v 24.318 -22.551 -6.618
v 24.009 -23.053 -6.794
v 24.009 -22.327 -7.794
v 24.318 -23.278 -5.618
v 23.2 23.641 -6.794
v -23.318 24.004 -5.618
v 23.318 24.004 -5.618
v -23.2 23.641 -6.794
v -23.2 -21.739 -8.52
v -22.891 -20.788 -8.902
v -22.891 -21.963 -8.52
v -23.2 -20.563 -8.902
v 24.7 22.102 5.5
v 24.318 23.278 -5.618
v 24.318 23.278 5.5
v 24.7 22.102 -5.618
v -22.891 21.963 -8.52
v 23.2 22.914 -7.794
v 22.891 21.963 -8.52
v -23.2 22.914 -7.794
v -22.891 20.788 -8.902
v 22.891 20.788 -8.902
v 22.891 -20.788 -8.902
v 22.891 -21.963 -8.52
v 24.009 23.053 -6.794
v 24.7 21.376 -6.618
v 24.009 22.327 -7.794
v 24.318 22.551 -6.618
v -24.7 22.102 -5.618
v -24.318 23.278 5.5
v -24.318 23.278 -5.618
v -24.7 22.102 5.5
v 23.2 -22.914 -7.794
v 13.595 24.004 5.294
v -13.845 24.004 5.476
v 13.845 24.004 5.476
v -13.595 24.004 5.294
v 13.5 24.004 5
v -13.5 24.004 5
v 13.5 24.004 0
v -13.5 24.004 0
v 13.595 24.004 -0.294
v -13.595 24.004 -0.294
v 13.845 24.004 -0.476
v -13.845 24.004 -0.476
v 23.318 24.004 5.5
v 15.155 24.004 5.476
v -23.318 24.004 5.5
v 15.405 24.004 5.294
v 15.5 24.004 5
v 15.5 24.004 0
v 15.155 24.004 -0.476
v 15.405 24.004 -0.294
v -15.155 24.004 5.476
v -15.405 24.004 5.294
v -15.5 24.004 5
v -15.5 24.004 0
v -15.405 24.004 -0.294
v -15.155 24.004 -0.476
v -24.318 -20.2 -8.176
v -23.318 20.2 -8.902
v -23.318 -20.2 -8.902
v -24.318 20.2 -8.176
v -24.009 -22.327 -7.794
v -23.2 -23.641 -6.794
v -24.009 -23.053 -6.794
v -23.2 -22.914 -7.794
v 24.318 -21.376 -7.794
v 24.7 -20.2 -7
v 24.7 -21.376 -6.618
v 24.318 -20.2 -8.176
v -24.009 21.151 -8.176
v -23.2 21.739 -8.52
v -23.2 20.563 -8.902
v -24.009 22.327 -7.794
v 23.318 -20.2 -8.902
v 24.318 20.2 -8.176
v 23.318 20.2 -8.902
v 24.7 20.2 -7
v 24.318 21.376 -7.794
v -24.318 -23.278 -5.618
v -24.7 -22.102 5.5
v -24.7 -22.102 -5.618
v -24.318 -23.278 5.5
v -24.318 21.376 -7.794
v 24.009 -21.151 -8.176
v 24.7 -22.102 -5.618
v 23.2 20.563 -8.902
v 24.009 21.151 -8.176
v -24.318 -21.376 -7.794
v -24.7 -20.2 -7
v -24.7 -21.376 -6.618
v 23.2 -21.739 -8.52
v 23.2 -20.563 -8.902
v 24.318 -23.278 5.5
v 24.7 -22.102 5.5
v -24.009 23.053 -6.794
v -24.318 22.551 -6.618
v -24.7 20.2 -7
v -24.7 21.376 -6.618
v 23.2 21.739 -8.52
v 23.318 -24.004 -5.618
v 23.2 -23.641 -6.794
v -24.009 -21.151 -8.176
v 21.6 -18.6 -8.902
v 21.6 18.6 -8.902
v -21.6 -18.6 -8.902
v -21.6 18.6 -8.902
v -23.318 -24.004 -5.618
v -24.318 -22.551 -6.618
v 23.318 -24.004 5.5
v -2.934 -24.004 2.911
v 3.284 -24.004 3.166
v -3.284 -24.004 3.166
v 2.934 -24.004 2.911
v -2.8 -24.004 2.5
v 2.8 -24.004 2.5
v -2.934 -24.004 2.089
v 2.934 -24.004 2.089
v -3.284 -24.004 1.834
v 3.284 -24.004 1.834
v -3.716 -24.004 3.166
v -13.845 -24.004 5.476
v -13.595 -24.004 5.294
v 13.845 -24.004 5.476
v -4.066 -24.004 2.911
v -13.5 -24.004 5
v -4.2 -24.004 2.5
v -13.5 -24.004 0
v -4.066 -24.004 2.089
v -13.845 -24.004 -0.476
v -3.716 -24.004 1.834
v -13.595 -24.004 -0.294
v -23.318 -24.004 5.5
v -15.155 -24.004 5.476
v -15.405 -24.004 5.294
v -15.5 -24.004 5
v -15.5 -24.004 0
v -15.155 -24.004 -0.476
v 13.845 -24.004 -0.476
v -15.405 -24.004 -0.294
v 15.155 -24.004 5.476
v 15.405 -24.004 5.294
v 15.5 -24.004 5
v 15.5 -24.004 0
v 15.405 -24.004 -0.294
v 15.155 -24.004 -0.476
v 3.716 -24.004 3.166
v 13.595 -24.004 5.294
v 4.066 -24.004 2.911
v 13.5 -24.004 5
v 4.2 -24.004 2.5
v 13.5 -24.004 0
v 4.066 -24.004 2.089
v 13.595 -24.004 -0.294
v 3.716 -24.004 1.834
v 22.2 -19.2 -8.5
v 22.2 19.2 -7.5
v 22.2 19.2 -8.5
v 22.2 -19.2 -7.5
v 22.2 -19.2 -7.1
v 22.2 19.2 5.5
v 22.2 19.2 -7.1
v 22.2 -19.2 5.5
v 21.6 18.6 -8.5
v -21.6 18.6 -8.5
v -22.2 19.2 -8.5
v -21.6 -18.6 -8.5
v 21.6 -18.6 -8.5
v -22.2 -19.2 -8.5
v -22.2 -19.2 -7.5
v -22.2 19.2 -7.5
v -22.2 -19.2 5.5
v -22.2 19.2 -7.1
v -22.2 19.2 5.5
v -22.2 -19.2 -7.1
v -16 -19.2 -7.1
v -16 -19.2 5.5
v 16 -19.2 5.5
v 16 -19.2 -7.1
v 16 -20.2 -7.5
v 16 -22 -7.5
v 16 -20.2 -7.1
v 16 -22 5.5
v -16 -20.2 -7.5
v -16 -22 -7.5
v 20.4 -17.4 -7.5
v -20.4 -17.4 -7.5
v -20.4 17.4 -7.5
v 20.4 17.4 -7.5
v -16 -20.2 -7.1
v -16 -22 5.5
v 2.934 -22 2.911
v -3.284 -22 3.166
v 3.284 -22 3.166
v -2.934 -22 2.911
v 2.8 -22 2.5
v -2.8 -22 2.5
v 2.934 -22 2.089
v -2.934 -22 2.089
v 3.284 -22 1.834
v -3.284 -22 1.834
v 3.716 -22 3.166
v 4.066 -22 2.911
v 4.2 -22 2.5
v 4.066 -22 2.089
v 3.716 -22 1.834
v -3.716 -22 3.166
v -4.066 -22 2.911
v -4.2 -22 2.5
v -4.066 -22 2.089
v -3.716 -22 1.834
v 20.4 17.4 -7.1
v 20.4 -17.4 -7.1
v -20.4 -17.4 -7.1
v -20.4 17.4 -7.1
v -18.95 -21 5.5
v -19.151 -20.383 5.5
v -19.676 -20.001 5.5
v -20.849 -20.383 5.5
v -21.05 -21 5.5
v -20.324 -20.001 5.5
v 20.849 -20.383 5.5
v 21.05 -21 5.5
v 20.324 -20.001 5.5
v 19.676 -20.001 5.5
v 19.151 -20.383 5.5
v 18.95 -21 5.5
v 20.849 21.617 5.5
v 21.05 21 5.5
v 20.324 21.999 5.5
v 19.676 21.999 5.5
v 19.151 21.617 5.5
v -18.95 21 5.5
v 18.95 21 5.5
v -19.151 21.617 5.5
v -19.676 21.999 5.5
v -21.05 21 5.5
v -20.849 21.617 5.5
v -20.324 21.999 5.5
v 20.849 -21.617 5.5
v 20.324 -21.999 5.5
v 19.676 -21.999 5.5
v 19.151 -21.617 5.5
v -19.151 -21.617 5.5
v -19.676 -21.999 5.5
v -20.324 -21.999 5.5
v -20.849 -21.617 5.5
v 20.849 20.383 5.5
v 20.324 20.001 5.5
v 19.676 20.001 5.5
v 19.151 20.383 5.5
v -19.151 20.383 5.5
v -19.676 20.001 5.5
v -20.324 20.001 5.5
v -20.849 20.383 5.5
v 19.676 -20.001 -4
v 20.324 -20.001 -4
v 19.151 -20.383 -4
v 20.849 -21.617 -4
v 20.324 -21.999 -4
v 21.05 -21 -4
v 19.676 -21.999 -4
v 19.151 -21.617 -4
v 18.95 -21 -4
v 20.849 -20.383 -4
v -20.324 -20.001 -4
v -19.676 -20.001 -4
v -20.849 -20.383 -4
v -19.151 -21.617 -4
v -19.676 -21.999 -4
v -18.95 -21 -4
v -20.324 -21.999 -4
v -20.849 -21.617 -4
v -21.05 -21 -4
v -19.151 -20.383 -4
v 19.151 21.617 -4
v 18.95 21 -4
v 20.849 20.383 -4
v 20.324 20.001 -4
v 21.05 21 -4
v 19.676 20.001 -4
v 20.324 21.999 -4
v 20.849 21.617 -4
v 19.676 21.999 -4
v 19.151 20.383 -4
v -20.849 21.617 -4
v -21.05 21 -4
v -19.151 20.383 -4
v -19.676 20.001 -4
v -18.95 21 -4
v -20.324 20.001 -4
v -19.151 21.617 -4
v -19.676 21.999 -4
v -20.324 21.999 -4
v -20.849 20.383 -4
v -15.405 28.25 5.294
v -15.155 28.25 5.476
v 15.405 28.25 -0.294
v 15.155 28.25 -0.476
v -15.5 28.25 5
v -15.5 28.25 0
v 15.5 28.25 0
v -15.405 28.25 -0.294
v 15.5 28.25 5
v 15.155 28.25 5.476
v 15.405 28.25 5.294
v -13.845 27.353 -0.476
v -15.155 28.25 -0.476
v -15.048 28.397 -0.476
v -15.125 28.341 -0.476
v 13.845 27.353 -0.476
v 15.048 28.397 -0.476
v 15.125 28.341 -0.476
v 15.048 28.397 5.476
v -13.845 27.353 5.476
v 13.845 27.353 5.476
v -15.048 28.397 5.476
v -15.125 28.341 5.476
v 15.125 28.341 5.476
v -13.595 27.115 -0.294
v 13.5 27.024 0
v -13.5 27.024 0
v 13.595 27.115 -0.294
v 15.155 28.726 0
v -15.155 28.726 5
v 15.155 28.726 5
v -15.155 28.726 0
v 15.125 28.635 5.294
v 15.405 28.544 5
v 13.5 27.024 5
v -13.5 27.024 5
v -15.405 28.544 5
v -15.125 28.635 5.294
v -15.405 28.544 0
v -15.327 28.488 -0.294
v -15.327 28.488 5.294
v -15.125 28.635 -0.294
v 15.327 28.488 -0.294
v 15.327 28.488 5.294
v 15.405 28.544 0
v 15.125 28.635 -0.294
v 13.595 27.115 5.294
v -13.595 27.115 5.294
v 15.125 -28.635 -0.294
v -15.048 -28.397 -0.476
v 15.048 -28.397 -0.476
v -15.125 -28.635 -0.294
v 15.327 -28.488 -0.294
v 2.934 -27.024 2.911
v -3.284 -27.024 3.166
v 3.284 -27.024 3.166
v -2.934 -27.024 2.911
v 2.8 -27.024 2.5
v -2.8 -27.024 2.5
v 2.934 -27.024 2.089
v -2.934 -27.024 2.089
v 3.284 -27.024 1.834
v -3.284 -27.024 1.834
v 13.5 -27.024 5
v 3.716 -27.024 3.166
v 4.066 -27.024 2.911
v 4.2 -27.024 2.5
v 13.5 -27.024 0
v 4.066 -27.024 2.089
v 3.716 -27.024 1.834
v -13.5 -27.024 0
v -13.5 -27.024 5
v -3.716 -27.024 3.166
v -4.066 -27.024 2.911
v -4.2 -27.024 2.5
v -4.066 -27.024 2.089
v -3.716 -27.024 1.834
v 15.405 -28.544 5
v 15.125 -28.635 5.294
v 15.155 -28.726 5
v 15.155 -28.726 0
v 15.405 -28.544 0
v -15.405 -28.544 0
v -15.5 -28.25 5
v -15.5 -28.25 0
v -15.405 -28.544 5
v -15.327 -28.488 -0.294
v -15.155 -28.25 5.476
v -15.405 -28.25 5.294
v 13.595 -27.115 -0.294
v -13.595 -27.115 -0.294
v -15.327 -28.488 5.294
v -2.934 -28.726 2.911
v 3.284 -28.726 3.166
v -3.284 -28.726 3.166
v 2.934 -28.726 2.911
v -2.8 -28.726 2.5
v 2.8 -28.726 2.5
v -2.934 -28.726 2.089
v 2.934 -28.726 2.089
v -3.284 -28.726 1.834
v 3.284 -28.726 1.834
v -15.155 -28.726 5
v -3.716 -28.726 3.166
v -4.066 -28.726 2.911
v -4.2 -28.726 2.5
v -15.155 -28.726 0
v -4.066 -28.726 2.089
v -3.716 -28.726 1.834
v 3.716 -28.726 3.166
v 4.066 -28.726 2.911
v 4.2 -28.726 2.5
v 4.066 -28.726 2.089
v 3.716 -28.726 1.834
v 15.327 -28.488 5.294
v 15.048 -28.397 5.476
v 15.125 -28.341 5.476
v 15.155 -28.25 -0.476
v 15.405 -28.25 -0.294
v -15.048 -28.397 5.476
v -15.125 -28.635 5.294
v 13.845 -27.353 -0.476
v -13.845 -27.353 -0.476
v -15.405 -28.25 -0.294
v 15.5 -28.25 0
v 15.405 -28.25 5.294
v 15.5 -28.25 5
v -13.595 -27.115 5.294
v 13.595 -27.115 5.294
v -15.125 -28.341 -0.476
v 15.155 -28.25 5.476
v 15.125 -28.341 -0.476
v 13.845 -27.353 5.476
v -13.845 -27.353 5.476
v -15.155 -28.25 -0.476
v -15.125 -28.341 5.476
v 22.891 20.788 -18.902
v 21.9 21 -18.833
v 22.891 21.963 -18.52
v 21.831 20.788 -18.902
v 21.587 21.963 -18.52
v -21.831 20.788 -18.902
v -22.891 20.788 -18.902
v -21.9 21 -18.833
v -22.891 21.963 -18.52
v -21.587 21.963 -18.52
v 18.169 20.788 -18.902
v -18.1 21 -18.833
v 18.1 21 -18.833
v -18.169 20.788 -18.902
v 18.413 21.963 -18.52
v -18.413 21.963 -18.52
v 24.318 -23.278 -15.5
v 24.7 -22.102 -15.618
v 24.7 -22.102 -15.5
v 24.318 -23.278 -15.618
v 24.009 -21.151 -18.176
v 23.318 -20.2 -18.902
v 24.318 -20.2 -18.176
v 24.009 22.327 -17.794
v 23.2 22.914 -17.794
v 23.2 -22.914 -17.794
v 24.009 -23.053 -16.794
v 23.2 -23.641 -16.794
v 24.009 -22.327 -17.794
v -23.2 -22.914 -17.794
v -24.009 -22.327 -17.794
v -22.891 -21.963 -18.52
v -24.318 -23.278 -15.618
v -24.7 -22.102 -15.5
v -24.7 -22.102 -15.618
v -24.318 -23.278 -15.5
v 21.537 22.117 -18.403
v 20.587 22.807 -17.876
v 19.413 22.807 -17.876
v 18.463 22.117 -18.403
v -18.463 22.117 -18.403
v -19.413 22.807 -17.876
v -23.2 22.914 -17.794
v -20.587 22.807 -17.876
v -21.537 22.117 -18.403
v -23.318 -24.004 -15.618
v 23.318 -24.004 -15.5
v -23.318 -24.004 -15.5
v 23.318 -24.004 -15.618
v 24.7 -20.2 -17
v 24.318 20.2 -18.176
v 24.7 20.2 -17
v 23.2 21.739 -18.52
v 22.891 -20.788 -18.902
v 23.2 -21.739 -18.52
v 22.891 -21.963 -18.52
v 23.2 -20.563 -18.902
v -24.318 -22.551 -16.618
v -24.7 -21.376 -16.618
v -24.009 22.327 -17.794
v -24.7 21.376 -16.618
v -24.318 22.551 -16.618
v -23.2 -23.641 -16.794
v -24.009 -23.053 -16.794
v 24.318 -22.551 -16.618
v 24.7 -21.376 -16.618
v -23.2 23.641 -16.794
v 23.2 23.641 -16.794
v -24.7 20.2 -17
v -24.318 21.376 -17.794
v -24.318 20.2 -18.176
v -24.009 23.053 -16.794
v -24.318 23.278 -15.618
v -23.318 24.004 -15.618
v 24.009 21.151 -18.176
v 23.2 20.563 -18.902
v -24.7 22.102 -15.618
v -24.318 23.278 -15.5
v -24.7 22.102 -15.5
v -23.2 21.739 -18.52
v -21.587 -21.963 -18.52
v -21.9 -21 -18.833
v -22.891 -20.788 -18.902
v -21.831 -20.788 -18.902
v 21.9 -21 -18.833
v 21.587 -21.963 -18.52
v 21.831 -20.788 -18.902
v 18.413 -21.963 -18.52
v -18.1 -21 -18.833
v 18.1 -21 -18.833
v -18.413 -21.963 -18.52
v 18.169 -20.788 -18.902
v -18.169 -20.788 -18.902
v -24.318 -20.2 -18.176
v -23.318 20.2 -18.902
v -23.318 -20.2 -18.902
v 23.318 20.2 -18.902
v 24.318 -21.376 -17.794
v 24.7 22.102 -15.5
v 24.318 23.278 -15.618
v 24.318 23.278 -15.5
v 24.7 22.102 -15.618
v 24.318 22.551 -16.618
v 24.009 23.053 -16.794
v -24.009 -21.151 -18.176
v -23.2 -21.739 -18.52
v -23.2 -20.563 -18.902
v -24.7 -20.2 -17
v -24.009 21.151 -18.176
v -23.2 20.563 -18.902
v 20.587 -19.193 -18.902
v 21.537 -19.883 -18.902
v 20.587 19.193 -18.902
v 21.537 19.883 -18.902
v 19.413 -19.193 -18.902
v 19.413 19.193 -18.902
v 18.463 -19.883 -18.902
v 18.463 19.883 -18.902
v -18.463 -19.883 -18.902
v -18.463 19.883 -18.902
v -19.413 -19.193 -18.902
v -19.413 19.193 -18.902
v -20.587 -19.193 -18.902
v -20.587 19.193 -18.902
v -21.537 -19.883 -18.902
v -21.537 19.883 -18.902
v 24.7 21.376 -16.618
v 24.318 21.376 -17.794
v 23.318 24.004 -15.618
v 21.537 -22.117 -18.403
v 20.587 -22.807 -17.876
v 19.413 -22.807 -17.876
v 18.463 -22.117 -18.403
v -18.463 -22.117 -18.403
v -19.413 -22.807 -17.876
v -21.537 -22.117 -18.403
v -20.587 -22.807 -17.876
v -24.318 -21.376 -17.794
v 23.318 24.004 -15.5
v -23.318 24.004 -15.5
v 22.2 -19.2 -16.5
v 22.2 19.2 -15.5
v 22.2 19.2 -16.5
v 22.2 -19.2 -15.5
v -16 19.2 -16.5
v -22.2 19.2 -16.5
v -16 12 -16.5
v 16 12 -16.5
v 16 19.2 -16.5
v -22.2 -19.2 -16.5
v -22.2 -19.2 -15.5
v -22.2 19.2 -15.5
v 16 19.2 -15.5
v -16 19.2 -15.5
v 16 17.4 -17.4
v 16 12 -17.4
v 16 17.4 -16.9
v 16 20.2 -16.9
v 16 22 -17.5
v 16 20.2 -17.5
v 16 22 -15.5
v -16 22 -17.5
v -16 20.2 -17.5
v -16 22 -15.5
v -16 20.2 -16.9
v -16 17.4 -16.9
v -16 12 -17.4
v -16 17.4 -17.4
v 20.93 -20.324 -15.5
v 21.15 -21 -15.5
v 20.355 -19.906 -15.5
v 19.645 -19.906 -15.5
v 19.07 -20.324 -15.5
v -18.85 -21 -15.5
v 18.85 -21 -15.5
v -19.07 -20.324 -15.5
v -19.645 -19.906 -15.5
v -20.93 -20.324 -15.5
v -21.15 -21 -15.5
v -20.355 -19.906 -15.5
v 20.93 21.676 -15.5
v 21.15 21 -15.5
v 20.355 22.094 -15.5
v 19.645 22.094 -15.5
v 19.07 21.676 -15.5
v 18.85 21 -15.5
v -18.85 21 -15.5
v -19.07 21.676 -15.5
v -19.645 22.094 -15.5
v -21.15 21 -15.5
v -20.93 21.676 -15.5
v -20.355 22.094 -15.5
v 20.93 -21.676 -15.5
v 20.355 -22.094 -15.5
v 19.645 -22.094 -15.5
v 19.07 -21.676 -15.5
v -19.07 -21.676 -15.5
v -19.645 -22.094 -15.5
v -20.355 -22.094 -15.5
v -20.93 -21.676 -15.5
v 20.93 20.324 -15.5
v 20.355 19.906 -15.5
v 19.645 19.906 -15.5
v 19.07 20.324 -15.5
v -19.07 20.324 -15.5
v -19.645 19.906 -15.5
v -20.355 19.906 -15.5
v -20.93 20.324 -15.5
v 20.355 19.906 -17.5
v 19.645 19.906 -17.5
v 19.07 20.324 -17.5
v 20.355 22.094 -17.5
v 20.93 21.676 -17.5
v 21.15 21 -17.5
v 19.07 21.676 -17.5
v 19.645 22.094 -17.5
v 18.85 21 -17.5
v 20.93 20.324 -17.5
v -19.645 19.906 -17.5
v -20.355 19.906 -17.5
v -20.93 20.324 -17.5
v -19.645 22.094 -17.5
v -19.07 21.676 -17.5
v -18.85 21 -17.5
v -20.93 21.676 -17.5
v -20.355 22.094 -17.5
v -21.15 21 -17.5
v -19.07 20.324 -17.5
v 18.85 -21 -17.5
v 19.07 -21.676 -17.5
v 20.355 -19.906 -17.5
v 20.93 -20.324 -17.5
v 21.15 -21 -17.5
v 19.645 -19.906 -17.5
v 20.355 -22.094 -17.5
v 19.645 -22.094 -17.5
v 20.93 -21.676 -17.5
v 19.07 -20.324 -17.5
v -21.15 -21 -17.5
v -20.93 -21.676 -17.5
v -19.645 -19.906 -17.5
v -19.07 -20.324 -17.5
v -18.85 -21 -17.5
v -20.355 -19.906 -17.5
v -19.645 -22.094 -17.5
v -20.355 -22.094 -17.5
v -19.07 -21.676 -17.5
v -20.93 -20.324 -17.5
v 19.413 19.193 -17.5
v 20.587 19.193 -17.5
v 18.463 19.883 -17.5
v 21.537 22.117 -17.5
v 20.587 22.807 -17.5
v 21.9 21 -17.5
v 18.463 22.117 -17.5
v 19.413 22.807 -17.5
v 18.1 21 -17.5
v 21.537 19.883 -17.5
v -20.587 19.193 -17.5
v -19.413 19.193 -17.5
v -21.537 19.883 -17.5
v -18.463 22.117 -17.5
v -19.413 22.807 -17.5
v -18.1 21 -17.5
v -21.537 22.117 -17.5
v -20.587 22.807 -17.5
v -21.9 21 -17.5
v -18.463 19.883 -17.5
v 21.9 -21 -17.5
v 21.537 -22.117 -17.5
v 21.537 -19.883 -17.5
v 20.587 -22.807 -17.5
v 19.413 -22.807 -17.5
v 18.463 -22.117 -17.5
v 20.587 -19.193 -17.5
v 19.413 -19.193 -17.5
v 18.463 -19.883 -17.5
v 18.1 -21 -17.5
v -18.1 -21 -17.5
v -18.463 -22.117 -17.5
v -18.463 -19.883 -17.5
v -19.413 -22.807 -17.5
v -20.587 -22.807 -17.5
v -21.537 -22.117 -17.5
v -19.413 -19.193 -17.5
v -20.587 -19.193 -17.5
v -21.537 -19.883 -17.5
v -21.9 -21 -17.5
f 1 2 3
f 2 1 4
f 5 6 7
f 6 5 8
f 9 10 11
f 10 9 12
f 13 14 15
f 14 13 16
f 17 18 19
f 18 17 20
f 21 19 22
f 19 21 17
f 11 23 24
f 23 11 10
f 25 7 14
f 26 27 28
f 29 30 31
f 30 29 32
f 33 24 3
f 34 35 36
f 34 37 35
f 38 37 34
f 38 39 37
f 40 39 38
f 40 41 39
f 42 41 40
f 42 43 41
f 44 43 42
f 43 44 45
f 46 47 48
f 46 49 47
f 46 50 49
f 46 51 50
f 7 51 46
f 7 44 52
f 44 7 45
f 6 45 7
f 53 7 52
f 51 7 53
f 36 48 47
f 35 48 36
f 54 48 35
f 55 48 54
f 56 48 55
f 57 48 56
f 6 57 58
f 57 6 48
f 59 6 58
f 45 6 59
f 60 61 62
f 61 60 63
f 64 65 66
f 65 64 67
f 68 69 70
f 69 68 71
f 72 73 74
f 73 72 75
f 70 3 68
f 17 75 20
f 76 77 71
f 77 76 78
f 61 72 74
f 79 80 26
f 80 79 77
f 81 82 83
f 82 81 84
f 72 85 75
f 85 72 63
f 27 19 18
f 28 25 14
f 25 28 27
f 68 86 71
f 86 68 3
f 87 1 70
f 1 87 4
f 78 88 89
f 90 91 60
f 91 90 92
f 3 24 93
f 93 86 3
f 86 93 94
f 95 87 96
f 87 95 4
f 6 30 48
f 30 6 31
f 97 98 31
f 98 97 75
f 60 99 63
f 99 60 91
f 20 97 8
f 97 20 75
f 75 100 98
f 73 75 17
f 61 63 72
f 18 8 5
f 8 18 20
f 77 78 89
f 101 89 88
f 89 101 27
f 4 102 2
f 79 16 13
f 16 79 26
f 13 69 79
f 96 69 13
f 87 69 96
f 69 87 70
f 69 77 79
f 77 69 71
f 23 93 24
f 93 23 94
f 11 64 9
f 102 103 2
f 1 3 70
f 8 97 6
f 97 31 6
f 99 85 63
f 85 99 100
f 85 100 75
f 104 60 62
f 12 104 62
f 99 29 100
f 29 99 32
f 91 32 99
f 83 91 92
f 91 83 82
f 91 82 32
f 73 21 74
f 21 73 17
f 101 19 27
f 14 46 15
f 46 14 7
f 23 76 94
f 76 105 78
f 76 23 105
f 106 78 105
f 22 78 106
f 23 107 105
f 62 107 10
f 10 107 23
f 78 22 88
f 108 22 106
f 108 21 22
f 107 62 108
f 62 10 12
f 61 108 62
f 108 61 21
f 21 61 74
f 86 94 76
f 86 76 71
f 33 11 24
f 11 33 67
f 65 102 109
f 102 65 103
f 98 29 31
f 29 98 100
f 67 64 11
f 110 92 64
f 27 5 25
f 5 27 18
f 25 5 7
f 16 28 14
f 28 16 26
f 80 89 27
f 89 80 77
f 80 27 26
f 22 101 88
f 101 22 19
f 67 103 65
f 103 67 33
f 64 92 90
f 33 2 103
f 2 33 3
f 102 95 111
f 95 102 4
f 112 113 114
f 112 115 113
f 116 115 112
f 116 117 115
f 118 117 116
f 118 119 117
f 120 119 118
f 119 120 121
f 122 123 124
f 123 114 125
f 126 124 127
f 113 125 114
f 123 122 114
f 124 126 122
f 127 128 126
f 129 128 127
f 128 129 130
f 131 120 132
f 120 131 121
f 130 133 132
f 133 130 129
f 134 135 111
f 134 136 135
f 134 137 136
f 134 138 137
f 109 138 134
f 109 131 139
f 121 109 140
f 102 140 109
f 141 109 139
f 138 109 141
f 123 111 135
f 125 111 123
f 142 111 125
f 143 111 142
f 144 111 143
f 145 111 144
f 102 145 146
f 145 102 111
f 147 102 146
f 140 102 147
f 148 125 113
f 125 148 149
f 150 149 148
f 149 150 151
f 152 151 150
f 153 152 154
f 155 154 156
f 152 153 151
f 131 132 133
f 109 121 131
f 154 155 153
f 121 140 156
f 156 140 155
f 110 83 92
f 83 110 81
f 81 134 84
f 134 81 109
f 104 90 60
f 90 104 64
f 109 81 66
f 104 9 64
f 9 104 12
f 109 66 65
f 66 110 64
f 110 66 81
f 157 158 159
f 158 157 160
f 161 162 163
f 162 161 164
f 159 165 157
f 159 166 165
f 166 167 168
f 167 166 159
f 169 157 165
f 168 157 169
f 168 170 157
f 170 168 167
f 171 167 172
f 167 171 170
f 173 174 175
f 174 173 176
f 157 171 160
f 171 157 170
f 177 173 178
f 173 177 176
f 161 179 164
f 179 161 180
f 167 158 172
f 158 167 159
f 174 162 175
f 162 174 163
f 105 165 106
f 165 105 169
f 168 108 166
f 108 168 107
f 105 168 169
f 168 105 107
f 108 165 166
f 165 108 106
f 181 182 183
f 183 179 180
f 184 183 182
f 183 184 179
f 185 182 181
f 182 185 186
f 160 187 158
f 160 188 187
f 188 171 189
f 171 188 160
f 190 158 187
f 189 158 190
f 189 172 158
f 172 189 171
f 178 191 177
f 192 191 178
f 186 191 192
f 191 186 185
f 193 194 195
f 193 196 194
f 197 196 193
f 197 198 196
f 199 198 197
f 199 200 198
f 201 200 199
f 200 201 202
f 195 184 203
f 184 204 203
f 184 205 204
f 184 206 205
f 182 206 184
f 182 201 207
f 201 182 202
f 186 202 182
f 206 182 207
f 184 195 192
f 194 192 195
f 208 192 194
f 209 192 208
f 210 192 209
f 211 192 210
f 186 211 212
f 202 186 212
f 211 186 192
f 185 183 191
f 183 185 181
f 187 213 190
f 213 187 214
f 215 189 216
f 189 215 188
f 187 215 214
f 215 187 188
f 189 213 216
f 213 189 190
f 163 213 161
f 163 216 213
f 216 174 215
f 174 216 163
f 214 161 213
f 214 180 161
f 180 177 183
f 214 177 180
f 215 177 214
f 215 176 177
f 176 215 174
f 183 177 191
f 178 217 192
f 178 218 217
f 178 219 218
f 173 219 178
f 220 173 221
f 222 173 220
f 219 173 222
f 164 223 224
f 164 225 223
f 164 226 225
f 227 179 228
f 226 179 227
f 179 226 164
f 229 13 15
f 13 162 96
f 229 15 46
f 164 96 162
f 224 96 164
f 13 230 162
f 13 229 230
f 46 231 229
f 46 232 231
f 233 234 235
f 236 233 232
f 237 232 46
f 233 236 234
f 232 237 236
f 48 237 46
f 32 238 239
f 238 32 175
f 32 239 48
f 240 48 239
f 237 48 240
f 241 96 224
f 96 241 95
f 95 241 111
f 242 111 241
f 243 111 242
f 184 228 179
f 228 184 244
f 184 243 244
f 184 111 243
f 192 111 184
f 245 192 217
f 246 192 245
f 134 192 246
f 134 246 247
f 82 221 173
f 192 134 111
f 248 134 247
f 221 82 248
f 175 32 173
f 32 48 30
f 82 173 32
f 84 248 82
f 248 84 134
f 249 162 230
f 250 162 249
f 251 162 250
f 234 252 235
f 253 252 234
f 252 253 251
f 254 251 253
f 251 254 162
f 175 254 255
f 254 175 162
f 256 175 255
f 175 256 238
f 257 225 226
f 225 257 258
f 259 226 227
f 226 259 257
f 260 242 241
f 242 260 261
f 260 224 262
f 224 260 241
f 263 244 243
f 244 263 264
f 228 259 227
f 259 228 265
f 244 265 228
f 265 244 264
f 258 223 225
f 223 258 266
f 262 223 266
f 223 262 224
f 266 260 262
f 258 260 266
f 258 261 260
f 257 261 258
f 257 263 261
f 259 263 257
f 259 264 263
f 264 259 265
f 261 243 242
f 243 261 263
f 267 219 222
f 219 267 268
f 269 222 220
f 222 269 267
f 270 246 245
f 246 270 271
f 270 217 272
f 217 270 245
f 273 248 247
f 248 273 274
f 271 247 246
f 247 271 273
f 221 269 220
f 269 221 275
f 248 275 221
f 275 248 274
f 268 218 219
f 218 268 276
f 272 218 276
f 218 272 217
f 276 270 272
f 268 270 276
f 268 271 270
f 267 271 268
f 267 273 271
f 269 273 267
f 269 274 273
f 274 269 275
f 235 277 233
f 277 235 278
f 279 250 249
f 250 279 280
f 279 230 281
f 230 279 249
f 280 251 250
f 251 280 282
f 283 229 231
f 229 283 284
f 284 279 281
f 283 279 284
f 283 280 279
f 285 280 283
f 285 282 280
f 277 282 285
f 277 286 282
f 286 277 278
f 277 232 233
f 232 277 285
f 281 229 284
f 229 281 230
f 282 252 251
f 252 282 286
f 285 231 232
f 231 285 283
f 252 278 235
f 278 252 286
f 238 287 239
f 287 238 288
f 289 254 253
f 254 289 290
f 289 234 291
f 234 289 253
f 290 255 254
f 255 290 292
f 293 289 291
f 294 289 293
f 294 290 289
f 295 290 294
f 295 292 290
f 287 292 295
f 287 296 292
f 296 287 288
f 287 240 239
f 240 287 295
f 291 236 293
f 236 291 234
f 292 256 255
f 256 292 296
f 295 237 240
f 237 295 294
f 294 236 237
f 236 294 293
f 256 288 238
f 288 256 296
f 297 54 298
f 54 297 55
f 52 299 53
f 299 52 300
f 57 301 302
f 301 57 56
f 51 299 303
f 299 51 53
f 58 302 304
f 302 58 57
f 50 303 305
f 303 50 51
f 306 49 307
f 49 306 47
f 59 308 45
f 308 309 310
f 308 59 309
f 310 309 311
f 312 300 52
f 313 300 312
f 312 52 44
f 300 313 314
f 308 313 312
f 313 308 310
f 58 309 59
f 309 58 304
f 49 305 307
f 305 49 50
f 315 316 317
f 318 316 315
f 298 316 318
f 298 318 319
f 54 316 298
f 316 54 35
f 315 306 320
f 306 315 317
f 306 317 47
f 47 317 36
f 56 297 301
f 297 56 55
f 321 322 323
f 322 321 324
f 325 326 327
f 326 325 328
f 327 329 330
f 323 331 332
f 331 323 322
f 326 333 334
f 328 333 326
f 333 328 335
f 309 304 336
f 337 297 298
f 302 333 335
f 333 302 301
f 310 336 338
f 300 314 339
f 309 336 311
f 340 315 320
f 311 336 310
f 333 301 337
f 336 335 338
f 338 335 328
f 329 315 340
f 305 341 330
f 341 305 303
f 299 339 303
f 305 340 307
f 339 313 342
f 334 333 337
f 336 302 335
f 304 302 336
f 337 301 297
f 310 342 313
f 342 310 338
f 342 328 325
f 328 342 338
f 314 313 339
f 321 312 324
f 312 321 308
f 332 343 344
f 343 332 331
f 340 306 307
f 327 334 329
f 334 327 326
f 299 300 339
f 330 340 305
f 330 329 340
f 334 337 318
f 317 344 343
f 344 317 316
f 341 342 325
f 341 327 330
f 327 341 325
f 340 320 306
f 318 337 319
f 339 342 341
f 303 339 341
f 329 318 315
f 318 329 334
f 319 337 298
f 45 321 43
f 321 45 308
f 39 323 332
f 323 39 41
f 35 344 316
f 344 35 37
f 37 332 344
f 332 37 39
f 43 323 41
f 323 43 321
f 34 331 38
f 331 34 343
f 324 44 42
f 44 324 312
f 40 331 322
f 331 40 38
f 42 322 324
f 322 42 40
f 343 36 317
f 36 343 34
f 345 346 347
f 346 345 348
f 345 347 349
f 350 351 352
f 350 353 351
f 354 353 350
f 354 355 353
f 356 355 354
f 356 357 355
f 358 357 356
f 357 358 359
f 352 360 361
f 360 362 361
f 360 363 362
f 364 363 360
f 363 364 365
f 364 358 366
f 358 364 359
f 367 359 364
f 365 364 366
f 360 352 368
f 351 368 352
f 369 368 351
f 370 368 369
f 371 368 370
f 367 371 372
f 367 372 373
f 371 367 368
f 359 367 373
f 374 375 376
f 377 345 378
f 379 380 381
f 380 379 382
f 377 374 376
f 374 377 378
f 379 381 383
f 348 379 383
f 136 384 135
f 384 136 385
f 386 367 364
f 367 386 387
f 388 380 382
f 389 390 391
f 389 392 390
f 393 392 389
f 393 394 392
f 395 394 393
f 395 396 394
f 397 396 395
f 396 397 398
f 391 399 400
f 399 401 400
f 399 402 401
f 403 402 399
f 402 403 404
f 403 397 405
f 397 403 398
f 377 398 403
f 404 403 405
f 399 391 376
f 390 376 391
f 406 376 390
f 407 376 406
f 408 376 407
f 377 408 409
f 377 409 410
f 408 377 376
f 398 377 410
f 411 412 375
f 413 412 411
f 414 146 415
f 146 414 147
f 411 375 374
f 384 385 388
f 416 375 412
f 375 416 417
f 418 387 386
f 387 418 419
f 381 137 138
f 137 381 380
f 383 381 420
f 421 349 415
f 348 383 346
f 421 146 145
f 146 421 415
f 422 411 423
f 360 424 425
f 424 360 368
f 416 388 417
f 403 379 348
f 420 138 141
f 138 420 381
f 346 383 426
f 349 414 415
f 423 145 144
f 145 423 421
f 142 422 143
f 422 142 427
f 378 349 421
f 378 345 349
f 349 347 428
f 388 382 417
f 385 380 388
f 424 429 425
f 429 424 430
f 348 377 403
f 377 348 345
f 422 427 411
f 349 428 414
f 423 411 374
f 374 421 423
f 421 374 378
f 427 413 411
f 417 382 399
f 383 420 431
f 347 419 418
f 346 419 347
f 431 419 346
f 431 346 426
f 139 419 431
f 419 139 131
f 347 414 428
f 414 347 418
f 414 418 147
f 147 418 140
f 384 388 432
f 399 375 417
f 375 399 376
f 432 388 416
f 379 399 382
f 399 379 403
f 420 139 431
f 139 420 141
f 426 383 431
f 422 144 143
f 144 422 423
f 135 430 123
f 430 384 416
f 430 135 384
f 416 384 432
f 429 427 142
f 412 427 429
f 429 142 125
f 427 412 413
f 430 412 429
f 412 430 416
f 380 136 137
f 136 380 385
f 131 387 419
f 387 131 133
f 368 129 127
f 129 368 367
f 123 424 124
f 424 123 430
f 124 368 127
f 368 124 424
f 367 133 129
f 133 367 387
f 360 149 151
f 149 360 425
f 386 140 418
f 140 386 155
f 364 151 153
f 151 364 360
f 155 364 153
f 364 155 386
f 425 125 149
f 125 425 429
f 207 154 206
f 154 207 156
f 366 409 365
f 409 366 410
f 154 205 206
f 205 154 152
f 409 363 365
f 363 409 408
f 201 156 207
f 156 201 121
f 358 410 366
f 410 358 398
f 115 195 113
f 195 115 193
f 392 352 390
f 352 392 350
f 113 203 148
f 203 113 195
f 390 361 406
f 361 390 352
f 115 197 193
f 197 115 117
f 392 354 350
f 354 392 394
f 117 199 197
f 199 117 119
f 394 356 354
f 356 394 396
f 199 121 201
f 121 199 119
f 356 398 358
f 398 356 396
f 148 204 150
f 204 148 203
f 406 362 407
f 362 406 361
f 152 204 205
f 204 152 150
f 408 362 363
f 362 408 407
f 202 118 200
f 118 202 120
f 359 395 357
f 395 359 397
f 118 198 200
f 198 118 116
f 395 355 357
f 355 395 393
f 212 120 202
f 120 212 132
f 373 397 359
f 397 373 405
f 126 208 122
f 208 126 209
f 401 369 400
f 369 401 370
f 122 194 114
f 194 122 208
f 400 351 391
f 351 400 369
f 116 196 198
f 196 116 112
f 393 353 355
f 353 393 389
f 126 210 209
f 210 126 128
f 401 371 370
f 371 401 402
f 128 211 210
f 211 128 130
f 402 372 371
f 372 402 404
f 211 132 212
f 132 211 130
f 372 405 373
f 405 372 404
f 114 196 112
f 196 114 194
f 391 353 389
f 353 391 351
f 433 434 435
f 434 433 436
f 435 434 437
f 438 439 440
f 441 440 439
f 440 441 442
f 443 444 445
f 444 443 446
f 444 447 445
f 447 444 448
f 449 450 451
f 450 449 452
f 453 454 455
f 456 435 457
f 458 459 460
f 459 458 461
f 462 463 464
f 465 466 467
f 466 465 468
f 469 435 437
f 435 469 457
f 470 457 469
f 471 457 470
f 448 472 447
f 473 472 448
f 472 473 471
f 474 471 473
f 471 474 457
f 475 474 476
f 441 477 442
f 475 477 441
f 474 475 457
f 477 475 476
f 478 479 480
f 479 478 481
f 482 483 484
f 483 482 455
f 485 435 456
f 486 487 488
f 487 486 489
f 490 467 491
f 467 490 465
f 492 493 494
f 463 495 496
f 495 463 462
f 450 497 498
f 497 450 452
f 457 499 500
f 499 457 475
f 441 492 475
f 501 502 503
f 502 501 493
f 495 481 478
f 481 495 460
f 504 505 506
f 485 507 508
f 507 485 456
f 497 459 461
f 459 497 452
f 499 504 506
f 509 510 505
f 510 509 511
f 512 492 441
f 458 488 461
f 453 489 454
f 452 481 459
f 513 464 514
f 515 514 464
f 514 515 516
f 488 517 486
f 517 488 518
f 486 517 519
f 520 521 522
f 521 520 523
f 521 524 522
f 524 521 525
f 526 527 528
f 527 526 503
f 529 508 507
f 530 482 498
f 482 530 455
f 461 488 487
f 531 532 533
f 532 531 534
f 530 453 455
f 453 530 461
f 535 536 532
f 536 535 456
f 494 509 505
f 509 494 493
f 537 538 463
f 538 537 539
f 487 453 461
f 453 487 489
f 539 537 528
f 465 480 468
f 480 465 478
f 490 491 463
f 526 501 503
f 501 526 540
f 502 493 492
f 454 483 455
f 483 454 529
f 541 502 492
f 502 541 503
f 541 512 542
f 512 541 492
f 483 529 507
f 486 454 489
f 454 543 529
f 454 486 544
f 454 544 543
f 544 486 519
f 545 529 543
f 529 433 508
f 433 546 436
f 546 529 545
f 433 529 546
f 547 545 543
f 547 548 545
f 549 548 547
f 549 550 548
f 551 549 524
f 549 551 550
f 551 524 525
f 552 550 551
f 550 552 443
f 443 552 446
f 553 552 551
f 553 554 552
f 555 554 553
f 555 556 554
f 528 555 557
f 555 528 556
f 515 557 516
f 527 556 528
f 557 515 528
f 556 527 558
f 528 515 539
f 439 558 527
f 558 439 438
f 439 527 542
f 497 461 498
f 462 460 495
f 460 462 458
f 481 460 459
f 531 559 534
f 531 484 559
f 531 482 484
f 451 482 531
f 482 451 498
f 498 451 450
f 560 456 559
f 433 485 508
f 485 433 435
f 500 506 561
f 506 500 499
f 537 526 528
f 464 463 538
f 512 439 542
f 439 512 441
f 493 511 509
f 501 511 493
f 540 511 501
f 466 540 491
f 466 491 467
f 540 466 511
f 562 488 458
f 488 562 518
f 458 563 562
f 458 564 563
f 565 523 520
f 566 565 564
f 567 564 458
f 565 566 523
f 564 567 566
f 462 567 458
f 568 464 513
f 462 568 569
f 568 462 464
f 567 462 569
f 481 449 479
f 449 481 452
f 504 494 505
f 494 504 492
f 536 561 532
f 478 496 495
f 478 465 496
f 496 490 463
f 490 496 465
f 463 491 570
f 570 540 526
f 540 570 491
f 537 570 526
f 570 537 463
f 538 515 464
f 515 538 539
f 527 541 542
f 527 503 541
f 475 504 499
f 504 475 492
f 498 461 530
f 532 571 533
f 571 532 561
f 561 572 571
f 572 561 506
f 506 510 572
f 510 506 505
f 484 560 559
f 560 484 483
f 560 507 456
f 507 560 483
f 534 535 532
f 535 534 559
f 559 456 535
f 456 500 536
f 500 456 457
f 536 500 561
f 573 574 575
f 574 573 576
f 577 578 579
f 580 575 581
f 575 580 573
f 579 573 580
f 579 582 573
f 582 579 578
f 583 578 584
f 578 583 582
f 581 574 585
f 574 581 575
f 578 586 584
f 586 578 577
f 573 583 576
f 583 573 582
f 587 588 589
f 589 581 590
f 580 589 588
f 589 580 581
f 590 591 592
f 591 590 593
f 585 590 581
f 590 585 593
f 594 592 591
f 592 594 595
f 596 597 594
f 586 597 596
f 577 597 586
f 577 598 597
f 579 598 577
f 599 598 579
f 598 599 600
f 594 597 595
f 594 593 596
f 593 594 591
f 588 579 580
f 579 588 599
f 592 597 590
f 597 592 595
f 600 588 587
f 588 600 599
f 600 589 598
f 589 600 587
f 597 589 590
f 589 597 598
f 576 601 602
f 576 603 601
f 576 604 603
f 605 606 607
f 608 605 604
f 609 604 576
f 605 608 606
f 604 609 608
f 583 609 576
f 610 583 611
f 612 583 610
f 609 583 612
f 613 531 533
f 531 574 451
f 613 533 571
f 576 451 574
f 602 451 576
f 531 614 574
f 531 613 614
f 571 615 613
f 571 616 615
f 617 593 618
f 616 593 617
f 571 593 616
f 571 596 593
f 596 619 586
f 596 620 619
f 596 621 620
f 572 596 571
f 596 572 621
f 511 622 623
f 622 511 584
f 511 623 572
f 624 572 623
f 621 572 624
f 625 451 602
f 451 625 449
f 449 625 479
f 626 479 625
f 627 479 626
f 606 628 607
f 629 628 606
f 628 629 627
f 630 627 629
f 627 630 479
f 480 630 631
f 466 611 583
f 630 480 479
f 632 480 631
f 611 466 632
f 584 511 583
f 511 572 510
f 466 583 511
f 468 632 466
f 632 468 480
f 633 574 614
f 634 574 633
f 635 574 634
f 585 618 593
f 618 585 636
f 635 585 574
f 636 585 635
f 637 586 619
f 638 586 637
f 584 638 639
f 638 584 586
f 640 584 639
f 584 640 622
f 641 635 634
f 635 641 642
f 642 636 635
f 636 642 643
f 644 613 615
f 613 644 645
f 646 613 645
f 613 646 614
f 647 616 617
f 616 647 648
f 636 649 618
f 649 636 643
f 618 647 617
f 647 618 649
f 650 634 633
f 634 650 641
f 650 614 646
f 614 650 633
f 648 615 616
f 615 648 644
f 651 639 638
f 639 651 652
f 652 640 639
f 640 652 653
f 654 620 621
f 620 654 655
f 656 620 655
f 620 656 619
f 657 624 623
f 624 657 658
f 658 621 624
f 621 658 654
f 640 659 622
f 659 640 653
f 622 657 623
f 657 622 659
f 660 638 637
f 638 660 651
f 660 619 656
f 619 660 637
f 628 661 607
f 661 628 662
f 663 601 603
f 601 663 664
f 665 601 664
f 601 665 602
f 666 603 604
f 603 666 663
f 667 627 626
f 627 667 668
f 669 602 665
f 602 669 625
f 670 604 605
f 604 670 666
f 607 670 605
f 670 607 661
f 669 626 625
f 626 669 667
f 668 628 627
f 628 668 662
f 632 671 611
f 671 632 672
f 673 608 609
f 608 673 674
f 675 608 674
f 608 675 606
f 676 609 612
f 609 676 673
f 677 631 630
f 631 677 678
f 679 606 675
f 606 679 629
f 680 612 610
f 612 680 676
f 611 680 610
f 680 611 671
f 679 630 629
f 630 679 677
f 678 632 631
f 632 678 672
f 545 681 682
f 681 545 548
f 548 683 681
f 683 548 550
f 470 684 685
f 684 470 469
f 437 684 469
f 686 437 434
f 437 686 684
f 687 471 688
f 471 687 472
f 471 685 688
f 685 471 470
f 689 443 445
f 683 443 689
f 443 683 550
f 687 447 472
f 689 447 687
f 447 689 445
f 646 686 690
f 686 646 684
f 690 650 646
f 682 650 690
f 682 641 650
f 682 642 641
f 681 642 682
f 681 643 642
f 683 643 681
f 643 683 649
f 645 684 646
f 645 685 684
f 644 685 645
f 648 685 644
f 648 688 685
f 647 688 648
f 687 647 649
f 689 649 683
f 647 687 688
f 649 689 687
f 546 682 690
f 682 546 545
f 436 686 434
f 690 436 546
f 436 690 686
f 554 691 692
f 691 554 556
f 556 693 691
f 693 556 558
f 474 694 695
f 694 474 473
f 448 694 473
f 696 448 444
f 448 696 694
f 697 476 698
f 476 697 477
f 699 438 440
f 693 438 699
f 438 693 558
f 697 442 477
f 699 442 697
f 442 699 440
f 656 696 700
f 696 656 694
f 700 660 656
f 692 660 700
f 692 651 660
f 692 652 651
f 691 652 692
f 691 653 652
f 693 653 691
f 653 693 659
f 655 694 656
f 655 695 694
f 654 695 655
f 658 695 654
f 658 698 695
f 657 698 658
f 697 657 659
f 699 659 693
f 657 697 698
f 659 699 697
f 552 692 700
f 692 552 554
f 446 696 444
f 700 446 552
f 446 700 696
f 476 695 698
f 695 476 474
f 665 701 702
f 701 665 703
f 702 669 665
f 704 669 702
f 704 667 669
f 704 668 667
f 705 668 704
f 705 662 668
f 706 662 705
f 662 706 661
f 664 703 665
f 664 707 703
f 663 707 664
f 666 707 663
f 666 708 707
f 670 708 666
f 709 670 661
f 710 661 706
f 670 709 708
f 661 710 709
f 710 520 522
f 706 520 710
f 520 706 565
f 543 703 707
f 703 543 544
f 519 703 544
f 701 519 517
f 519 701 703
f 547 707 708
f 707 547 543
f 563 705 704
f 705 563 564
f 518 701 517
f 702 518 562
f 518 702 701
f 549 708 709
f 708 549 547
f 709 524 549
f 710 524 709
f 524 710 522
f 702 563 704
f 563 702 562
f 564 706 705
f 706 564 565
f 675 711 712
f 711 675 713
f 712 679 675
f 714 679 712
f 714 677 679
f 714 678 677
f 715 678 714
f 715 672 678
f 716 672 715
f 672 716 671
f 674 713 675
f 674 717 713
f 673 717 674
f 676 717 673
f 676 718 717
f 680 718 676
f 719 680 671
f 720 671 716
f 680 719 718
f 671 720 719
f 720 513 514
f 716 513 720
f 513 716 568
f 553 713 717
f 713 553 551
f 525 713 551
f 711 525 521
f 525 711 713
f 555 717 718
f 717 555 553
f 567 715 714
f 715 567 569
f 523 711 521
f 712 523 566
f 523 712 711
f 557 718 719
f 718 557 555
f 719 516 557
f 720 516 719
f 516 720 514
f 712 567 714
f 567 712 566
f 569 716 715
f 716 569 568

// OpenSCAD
// file: module/bluetooth.scad
module bluetooth() {
    color("DarkSlateGray") cube([16.2,40.4,2.75], center=true);
}
// file: module/arduino.scad
module arduino() {
    color("Steelblue") cube([18.4,33.6,2.6], center=true);
}
// file: module/battery.scad
module battery()
    color("silver") cube([42,36,4], true);
    
battery();
// file: module/charger.scad
module charger() {
    color("Steelblue") cube([19.2,25.1,2.7], center=true); //Bord
    //color("Silver") translate([0,9,1.25]) cube([7.6,9.2,5.2], center=true); //USB Plug
}
charger();
// file: module/oled.scad
module oled() {
    color("Blue", 1) minkowski() {
        cube([23,23.4,1], center=true);
        cylinder(r=2,h=0.01, center=true);
    }
    color("Grey", 1) translate([0,0,0.9]) cube([27,19.5,0.8], center=true);
}

oled();
// file: module/button.scad
module button() {
    color("red") difference() {
        union() {
            cube([9,8,2], center=true);
            translate([0,0,-1]) cube([10,9,1], center=true);
        }
        translate([0,0,-0.8]) cube([8,7,3], center=true);
    }
}
rotate([180,0,0]) button();
// file: module/electronics.scad
use <oled.scad>;
use <button.scad>;
use <battery.scad>;
use <arduino.scad>;
use <bluetooth.scad>;
use <charger.scad>;

module electronics() {
    //oled();
    translate([0,8,-4]) rotate([0,0,90]) arduino();
    translate([0,-10,-4]) rotate([0,0,90]) bluetooth();
    //translate([0,0,-15]) charger();
    translate([0,0,-10]) battery();
}

electronics();
// main file
$fn=10;
$preview=false;

use<module/electronics.scad>
use<module/button.scad>
use<module/oled.scad>
use<module/charger.scad>

module armband() {
    minkowski() {
        difference() {
            cube([30,5.5,5], center=true);
            cube([28,4,6], center=true);
        }
        sphere(r=0.5);
    }
}

module main_body() {
    difference() {
        minkowski() {
            cube([44.4,40.4,10], center=true);
            sphere(r=2, center=true);
            rotate([0,90,0]) cylinder(r=2, center=true);
        }
        translate([0,0,1]) cube([44.4,38.4,15], center=true); //Inner space
        translate([0,0,10]) cube([43.2,37.2,10], center=true);
        translate([0,17,0]) cube([32,10,15], center=true);
    }
    
    difference() {
        cube([44.4,40.4,15], center=true);
        translate([0,0,0.1]) cube([40.8,34.8,15], center=true);
        translate([0,0,0.1])  cube([44.4,40.4,14], center=true);
    }
    
    if ($preview) {
        translate([0,7.3,5.8]) oled();
        
        translate([-11,-12,8.1]) button(); //Buttons
        translate([0,-12,8.1])     button();
        translate([11,-12,8.1])  button();
        
        translate([0,0,8])color("grey", 0.5) cube([43.2,37.2,2], center=true); //Glass
    }
}

module unibody() {
    difference() {
        union() {
            difference() {
                main_body();
                translate([0,0,-8]) cube([50,50,5], center=true);
                translate([20,21,-1]) cylinder(h=10,d=2.1, center=true);
                translate([-20,21,-1]) cylinder(h=10,d=2.1, center=true);
                translate([20,-21,-1]) cylinder(h=10,d=2.1, center=true);
                translate([-20,-21,-1]) cylinder(h=10,d=2.1, center=true);
            }
            
            translate([0,-25.5,-2.5]) armband();
            translate([0,25.5,-2.5]) armband();
        }
    translate([3.5,20,-2.5]) rotate([90,0,0]) cylinder(r=0.7,h=20, center=true); //Holes cables
    translate([-3.5,20,-2.5]) rotate([90,0,0]) cylinder(r=0.7,h=20, center=true);
    }
}

module backplate() {
    difference() {
        intersection() {
            main_body();
            translate([0,0,-8]) cube([50,50,5], center=true);
        }
        translate([20,21,-7]) cylinder(h=5,d=2.3, center=true);
        translate([-20,21,-7]) cylinder(h=5,d=2.3, center=true);
        translate([20,-21,-7]) cylinder(h=5,d=2.3, center=true);
        translate([-20,-21,-7]) cylinder(h=5,d=2.3, center=true);
        
        translate([20,21,-10]) cylinder(h=5,d=3.8, center=true);
        translate([-20,21,-10]) cylinder(h=5,d=3.8, center=true);
        translate([20,-21,-10]) cylinder(h=5,d=3.8, center=true);
        translate([-20,-21,-10]) cylinder(h=5,d=3.8, center=true);
    }
}

rotate([0,0,$t*360]) union() {
    if ($preview) {
        translate([0,0,38]) electronics();
        translate([0,0,25]) charger();
        translate([0,0,70]) unibody(); //Z=30
        translate([0,0,40]) translate([0,0,-10]) backplate();
    } else {
        rotate([180,0,0]) unibody();
        translate([0,0,-10]) backplate();
    }
}
